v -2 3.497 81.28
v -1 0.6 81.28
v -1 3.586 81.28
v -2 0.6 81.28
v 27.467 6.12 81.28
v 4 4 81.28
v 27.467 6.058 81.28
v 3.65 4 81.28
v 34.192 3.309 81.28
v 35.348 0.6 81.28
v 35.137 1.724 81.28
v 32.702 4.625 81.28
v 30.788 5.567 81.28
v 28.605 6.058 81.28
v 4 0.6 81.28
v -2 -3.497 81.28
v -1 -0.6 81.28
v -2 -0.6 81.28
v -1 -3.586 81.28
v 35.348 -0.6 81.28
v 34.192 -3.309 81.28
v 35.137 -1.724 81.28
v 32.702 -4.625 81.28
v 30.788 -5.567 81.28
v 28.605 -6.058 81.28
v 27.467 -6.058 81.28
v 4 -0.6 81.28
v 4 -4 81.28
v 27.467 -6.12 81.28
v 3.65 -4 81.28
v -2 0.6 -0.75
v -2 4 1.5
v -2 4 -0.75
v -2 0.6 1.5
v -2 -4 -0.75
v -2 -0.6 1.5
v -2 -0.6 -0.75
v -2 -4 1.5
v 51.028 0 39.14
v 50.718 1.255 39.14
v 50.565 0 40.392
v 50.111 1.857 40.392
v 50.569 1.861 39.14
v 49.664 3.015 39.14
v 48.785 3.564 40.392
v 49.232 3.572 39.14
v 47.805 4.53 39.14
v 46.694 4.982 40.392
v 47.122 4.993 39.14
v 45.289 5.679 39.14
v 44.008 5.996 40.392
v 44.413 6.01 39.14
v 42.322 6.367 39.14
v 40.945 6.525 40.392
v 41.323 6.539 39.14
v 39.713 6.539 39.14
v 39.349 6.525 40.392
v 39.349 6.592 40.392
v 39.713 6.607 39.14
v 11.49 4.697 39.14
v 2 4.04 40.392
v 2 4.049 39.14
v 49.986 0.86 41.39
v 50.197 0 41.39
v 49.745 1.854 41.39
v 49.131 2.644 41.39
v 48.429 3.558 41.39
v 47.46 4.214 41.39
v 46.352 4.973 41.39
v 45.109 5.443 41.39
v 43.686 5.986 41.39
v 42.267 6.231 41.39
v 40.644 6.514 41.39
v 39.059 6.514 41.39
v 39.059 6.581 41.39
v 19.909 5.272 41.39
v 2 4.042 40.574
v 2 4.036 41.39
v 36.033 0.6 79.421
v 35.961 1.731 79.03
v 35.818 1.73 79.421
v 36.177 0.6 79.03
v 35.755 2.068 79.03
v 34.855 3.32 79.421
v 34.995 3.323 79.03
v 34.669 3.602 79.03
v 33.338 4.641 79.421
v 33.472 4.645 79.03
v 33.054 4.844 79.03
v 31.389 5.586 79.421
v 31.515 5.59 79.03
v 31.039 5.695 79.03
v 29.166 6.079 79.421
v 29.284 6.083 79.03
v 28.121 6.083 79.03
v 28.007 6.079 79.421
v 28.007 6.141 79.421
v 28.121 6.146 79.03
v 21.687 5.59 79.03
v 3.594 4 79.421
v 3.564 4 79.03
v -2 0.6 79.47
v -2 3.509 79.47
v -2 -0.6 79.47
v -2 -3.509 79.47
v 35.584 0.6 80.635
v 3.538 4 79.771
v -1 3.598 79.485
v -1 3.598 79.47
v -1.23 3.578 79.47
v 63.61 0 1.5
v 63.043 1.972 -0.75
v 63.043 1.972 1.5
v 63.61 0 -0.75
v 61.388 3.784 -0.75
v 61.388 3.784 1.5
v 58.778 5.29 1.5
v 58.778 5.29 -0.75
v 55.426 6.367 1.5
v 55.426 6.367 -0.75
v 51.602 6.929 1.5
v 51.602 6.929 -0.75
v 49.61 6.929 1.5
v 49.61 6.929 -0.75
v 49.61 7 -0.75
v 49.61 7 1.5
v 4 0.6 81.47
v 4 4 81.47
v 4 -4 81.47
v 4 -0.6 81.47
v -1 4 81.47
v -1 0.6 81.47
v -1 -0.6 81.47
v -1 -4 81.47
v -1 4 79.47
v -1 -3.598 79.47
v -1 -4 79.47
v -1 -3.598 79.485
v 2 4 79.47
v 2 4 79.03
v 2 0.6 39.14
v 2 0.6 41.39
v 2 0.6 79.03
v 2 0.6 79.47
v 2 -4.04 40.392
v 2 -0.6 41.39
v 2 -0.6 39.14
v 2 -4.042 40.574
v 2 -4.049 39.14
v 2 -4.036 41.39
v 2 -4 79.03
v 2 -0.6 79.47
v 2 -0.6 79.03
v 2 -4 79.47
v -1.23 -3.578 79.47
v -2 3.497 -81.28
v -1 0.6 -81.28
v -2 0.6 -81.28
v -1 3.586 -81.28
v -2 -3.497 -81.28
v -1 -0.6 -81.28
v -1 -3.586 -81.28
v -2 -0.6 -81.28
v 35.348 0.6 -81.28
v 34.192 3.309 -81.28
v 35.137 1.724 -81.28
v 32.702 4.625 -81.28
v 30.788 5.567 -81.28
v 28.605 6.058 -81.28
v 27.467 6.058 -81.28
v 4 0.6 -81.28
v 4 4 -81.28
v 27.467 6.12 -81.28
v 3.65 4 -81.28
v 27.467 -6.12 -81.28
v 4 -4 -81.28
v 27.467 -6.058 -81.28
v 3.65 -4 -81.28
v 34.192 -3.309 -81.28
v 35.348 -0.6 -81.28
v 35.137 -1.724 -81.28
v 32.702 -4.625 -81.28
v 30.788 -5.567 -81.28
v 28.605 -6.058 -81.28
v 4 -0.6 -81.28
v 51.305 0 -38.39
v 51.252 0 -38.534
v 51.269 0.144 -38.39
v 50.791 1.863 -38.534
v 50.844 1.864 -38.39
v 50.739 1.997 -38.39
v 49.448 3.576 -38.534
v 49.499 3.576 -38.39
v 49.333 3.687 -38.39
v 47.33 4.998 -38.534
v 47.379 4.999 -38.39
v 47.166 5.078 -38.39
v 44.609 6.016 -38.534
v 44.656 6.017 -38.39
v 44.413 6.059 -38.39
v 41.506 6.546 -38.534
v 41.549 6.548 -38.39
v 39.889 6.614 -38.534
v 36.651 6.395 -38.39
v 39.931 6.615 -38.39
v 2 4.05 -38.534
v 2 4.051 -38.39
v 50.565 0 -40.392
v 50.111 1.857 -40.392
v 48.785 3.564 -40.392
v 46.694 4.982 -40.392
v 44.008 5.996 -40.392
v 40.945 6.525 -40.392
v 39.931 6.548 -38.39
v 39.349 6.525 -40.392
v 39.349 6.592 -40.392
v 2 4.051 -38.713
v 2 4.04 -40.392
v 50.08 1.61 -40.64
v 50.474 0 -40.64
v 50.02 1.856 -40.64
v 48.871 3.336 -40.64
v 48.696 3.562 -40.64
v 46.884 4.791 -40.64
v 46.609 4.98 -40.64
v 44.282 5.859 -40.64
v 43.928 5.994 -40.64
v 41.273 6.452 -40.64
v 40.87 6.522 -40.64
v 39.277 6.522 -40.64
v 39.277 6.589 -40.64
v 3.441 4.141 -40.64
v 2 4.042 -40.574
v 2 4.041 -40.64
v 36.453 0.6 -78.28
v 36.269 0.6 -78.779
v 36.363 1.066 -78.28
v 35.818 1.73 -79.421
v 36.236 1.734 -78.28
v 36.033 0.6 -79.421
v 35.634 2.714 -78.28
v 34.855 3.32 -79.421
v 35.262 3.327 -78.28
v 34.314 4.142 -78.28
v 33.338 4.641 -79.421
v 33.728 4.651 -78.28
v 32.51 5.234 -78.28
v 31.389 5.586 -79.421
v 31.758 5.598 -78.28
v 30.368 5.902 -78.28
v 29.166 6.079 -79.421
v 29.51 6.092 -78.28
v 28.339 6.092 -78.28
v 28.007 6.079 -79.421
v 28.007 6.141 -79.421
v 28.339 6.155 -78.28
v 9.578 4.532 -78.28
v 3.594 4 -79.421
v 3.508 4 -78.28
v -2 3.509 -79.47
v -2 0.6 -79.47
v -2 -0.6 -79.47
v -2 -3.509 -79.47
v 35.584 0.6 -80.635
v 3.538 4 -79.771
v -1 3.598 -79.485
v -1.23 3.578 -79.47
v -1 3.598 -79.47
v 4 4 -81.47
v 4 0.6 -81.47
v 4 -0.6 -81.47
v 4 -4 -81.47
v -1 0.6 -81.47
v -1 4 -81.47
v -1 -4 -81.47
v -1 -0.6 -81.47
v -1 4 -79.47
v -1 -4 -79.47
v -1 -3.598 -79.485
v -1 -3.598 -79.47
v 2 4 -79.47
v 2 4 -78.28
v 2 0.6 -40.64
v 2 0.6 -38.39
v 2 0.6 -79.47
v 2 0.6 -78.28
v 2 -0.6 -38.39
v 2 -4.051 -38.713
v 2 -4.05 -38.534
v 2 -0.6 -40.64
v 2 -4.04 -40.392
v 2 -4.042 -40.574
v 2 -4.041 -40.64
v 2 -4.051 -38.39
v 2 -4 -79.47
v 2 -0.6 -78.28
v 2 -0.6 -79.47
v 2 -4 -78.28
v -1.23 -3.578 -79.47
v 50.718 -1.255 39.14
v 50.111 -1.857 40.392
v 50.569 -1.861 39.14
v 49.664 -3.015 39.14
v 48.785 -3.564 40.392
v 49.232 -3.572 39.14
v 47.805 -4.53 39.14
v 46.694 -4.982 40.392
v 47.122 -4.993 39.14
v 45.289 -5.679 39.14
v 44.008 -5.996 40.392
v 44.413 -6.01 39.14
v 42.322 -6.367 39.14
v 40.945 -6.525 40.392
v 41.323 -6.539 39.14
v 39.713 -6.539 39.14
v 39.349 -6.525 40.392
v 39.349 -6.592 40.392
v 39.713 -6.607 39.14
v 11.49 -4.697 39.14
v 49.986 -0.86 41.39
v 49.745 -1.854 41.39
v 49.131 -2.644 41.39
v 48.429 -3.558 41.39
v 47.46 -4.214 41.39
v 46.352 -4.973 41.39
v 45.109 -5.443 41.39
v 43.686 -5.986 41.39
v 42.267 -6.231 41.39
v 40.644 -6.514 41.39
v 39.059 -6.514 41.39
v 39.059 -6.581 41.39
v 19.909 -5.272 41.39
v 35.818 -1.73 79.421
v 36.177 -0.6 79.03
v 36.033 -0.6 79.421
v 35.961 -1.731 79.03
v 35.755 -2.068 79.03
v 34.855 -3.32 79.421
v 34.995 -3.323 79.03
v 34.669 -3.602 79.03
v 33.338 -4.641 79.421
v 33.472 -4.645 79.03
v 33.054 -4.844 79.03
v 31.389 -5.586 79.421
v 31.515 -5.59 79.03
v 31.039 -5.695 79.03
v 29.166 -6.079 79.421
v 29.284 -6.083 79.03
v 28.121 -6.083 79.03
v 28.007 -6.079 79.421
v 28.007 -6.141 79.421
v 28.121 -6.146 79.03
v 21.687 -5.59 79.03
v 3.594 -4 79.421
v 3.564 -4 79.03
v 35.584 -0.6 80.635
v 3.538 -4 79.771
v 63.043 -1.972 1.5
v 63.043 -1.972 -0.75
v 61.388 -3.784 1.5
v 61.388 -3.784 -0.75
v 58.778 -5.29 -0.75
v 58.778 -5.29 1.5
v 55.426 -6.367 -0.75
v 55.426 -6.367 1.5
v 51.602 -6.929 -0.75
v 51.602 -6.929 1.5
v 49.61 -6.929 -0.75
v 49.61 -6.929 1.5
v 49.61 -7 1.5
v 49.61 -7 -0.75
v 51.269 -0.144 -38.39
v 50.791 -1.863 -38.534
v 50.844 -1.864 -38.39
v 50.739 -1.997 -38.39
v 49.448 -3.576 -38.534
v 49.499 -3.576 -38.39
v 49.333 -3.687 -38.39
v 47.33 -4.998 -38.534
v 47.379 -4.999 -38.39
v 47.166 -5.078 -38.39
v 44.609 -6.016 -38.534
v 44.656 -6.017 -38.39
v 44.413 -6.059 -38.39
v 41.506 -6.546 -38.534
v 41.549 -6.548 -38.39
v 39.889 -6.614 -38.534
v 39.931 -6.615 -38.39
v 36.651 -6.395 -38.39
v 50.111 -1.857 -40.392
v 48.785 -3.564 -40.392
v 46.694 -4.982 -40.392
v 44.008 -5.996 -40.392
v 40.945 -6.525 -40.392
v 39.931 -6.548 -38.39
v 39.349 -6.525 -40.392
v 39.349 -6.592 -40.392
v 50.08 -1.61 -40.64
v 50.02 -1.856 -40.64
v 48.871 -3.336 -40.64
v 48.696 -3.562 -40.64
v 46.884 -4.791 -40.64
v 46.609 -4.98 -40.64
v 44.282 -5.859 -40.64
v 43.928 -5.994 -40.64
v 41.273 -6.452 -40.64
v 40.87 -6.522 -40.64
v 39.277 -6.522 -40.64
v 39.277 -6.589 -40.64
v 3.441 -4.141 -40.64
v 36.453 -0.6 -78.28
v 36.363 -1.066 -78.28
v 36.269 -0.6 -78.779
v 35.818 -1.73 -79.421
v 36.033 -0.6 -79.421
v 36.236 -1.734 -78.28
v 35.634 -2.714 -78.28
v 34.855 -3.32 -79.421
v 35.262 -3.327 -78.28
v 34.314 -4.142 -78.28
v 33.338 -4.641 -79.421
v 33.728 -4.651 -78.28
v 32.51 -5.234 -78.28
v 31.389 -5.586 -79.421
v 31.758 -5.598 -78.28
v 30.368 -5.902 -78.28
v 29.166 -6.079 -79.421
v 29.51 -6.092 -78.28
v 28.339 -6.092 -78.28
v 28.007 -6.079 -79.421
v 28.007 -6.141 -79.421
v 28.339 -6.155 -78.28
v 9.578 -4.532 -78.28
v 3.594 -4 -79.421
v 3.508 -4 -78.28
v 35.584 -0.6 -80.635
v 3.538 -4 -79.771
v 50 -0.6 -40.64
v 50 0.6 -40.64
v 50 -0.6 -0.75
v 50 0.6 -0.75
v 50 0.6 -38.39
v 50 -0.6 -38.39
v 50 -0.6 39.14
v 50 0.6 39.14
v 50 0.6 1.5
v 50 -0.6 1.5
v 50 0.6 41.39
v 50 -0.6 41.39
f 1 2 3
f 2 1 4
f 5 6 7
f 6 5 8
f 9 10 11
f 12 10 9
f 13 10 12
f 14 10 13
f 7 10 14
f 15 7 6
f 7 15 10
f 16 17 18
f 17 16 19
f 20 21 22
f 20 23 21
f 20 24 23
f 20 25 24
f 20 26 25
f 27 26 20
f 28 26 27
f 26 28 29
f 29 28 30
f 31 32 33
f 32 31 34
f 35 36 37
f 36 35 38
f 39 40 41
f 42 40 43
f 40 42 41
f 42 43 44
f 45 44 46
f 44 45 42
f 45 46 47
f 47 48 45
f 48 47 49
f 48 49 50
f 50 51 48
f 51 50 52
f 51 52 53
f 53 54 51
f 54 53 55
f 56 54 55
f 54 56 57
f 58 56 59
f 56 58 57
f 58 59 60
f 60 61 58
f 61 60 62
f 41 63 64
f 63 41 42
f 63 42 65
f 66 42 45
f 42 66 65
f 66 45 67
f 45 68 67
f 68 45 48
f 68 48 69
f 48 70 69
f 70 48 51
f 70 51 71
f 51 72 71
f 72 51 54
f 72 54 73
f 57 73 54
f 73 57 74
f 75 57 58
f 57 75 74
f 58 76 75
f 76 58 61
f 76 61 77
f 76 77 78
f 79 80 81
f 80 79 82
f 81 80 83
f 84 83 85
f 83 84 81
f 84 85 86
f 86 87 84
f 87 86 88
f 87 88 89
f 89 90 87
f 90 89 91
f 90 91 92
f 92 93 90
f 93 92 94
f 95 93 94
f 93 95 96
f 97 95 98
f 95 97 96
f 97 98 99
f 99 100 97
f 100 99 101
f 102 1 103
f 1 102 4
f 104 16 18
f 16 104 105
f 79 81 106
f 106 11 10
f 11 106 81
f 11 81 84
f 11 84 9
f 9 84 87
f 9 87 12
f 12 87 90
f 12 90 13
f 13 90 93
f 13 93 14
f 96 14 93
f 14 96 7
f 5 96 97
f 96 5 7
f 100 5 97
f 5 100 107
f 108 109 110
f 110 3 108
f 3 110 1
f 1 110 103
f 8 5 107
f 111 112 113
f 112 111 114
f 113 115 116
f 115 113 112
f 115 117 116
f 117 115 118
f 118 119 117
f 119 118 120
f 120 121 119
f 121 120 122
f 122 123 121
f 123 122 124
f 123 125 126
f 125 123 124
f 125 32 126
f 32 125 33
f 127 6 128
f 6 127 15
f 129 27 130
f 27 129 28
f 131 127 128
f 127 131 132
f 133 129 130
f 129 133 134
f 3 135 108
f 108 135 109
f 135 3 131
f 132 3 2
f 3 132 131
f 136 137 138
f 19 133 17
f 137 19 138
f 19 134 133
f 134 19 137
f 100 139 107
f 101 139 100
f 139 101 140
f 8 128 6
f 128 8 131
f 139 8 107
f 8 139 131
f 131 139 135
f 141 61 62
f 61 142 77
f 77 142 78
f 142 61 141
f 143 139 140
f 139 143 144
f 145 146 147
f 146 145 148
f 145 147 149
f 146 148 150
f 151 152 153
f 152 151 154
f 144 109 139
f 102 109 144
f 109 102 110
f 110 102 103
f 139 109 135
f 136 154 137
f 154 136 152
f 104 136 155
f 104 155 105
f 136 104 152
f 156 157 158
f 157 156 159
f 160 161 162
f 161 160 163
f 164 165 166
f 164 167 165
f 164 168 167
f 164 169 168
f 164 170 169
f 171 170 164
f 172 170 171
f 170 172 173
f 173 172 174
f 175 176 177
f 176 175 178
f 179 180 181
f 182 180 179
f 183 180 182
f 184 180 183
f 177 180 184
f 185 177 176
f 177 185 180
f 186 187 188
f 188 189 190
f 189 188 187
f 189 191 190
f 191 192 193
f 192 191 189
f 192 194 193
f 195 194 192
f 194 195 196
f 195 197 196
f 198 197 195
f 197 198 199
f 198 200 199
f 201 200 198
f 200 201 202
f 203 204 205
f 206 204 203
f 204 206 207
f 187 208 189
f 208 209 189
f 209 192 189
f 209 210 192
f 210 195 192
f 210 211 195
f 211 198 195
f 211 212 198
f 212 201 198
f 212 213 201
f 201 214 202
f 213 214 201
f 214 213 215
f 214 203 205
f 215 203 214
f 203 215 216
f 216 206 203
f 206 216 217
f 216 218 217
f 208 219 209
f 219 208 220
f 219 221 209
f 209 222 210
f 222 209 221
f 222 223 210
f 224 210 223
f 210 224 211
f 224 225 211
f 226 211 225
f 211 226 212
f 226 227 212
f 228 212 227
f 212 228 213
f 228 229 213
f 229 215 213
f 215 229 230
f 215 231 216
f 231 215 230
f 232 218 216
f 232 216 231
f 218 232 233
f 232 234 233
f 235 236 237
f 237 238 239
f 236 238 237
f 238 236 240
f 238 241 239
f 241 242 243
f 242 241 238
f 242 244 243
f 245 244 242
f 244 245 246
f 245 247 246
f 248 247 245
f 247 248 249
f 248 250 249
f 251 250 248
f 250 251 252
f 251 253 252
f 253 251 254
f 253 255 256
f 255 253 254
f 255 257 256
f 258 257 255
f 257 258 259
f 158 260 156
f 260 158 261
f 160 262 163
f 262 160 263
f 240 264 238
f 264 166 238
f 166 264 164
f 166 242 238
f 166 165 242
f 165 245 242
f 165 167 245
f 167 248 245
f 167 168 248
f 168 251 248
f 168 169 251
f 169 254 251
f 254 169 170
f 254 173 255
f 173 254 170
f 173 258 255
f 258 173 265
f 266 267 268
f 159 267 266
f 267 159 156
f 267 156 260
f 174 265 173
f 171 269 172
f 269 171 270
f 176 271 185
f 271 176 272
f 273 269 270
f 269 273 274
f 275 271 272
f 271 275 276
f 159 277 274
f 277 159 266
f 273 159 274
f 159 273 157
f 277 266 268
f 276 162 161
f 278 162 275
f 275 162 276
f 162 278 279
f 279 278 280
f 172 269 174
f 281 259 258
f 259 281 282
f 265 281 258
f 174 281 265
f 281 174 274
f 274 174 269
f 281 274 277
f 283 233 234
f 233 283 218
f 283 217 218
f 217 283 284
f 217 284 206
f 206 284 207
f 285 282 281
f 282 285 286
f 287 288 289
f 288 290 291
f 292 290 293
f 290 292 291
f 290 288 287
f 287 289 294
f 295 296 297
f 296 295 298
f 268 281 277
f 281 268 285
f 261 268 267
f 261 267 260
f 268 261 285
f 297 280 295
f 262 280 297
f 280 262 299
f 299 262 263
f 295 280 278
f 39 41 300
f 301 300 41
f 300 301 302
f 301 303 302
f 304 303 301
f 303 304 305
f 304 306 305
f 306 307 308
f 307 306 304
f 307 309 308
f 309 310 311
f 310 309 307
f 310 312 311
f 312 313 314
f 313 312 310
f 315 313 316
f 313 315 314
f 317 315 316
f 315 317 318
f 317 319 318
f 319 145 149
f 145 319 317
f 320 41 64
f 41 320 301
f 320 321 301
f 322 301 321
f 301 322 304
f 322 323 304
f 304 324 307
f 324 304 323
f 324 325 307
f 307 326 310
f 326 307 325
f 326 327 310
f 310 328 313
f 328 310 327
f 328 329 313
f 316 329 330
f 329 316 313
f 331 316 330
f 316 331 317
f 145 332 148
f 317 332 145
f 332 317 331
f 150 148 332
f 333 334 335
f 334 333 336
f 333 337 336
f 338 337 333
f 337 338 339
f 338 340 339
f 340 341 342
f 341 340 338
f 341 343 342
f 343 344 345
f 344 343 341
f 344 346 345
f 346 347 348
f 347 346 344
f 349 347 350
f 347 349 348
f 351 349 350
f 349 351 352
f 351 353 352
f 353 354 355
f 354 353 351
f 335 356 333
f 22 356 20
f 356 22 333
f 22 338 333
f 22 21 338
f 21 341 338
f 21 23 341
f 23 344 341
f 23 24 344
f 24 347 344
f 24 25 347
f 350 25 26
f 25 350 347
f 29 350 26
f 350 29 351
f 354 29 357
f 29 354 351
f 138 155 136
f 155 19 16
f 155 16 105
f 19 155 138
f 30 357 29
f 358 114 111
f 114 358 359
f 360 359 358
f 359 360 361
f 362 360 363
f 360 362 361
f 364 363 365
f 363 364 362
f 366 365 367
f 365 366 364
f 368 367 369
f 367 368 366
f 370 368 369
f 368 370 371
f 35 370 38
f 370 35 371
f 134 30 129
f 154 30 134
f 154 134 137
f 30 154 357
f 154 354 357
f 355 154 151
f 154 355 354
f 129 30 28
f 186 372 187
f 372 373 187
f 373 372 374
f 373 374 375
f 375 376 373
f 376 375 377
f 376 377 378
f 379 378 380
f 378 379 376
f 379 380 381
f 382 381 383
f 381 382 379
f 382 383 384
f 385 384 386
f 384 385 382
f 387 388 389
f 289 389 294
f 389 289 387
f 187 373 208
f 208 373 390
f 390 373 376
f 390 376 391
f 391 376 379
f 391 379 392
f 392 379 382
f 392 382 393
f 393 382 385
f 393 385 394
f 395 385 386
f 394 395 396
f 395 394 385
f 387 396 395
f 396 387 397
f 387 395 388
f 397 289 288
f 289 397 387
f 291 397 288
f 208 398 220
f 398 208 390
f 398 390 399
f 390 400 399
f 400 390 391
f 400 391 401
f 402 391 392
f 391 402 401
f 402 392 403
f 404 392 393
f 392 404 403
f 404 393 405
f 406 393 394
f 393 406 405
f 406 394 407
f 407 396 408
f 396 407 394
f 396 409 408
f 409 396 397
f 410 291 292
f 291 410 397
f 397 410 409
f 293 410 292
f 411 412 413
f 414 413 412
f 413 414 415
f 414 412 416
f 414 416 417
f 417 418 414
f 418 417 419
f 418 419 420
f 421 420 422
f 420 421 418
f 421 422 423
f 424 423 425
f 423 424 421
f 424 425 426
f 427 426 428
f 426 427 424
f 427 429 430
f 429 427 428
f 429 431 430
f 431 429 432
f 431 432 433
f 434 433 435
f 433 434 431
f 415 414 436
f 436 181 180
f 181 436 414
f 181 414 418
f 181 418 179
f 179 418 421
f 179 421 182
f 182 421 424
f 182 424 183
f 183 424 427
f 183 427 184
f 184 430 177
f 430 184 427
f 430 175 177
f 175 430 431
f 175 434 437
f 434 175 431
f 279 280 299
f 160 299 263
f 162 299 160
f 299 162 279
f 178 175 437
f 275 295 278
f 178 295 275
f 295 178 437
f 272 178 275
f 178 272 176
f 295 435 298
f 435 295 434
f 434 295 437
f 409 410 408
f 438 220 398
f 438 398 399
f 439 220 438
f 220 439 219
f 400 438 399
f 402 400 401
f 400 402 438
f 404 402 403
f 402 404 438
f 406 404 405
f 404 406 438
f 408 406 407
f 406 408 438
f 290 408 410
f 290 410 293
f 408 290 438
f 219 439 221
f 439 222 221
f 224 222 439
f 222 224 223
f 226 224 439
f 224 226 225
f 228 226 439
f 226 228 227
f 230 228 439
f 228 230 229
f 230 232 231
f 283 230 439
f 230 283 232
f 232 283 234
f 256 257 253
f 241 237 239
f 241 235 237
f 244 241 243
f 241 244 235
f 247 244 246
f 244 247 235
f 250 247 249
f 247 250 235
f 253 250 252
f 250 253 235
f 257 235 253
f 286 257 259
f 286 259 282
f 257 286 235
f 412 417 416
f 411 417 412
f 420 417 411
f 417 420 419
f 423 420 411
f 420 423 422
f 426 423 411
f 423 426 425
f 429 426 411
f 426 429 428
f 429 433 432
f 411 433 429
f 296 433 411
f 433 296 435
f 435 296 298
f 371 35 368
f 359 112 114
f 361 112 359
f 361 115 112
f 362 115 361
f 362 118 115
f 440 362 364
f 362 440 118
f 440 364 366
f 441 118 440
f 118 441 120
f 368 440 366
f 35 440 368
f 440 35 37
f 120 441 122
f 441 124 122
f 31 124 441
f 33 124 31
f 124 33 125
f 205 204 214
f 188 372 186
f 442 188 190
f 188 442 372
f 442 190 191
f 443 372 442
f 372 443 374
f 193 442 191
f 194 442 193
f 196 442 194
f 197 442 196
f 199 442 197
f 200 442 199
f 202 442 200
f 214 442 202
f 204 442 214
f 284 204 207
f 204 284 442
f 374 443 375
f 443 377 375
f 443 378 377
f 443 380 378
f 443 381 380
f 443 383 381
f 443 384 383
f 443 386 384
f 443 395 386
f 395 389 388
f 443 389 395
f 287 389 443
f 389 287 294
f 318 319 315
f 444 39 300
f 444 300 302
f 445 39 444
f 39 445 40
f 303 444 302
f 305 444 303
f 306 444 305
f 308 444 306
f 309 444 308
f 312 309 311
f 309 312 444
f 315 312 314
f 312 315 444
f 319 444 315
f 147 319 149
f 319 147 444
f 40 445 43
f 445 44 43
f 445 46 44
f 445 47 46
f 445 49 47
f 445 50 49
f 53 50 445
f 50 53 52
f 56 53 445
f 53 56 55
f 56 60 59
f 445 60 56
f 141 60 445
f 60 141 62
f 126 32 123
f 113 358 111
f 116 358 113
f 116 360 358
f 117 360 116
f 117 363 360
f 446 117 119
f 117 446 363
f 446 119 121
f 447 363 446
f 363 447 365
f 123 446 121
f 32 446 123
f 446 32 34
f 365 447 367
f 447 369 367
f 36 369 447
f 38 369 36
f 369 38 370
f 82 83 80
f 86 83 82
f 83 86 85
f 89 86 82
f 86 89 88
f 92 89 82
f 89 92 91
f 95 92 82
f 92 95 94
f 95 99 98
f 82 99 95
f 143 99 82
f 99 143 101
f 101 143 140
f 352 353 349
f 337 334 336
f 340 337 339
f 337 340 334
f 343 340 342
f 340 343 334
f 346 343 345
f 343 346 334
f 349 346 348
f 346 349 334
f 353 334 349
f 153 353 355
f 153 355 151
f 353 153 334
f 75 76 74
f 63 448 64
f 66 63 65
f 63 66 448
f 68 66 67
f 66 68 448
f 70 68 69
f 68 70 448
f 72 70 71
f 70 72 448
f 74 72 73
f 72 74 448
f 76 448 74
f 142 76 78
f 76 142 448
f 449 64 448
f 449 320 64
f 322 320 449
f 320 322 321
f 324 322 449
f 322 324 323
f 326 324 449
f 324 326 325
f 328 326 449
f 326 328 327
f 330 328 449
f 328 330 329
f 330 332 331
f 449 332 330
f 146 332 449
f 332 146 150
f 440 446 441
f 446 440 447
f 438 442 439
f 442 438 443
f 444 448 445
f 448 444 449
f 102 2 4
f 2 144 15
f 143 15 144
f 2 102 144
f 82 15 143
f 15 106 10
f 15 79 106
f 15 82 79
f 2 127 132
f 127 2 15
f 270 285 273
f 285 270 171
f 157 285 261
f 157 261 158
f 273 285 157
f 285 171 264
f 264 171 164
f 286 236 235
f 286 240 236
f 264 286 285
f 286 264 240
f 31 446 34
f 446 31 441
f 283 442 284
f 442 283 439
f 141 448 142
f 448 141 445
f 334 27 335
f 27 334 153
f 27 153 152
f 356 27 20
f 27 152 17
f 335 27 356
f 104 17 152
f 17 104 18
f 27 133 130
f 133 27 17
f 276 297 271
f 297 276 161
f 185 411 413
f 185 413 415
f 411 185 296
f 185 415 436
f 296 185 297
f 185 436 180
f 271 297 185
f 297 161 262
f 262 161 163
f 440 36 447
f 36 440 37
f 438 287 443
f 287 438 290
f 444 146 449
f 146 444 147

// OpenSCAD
module wingEdge(startchord,endchord,leadingEdgeThickness,trailingEdgeThickness,thickness){
    mainWingLength = startchord-(leadingEdgeThickness);
    linear_extrude(height = thickness, convexity = 100, twist = 0,scale=[endchord/startchord,1-0.005*(abs(endchord-startchord))]){
    
    translate([mainWingLength,0,0]){
        scale([2,1,1,]){
    intersection(){
    square(leadingEdgeThickness,[0,0,0]);
    circle(r=leadingEdgeThickness);
    
}
}
    polygon(points=[[0,0],[0,leadingEdgeThickness],[-mainWingLength,trailingEdgeThickness],[-mainWingLength,0]]);
}
}
}
//6.4inches wide
//1.16 inches at wing edge
//2.15inches at wing middle
//front flat section at 0.2inches from center line
module wingsection(sliceThickness,startChord,endChord){

    wingthickness = 2;//mm
    leadingEdgeChord = 5;
    trailingEdgeChord = 2;
    translate([-wingthickness,0,0]){
    wingEdge(startChord+wingthickness*2,endChord+wingthickness*2,leadingEdgeChord+wingthickness,trailingEdgeChord+wingthickness,sliceThickness);
    }
}

module basicWingHalf(){
    wingCentre = 2.15*25.4;
    wingEdge = 1.16*25.4;
    winglength = 3.0*25.4;
    wingCentreLength = 0.2*25.4;
translate([0,0,0.2*25.4]){
    wingsection(winglength,wingCentre,wingEdge);
}
    wingsection(wingCentreLength,wingCentre,wingCentre);
}

//0.15in to 1.85in

module wingHalf(){
    offset = (3.2-1.85)*25.4;
    thickness = 2;
    length = 25.4*(1.85-0.15);
    difference(){
        union(){ 
            basicWingHalf();
            translate([-1,0,offset]){
                cube([5,4,length+2*thickness]);
            }
         }
        translate([-2*thickness,-thickness,offset+thickness]){
            cube([6,12,length]);
        }
    }
    
    
    
}

module copy_mirror(vec) 
{ 
    children(); 
    mirror(vec) children(); 
} 



//copy_mirror([0,1,0]){
//copy_mirror([0,0,1]){
//    wingHalf();
//}
//}
//wingspan = 6.4*25.4;
//thickness = 3;//mm
//cube([50,50,(wingspan/4)-thickness]);
difference(){
difference(){
    {
copy_mirror([0,1,0]){
copy_mirror([0,0,1]){
    wingHalf();
}
}
}
{
    wingspan = 6.4*25.4;
    thickness = 3;//mm
    for (i = [1:1:4]){
        translate([-10,-25,thickness-wingspan/2+((i-1)*(wingspan-thickness)/4)]){
        cube([100,50,(wingspan/4)-(thickness)]);
        }
        
    }
}
}
translate([-50,-0.6,-100]){
cube([100,1.2,200]);
}
}
